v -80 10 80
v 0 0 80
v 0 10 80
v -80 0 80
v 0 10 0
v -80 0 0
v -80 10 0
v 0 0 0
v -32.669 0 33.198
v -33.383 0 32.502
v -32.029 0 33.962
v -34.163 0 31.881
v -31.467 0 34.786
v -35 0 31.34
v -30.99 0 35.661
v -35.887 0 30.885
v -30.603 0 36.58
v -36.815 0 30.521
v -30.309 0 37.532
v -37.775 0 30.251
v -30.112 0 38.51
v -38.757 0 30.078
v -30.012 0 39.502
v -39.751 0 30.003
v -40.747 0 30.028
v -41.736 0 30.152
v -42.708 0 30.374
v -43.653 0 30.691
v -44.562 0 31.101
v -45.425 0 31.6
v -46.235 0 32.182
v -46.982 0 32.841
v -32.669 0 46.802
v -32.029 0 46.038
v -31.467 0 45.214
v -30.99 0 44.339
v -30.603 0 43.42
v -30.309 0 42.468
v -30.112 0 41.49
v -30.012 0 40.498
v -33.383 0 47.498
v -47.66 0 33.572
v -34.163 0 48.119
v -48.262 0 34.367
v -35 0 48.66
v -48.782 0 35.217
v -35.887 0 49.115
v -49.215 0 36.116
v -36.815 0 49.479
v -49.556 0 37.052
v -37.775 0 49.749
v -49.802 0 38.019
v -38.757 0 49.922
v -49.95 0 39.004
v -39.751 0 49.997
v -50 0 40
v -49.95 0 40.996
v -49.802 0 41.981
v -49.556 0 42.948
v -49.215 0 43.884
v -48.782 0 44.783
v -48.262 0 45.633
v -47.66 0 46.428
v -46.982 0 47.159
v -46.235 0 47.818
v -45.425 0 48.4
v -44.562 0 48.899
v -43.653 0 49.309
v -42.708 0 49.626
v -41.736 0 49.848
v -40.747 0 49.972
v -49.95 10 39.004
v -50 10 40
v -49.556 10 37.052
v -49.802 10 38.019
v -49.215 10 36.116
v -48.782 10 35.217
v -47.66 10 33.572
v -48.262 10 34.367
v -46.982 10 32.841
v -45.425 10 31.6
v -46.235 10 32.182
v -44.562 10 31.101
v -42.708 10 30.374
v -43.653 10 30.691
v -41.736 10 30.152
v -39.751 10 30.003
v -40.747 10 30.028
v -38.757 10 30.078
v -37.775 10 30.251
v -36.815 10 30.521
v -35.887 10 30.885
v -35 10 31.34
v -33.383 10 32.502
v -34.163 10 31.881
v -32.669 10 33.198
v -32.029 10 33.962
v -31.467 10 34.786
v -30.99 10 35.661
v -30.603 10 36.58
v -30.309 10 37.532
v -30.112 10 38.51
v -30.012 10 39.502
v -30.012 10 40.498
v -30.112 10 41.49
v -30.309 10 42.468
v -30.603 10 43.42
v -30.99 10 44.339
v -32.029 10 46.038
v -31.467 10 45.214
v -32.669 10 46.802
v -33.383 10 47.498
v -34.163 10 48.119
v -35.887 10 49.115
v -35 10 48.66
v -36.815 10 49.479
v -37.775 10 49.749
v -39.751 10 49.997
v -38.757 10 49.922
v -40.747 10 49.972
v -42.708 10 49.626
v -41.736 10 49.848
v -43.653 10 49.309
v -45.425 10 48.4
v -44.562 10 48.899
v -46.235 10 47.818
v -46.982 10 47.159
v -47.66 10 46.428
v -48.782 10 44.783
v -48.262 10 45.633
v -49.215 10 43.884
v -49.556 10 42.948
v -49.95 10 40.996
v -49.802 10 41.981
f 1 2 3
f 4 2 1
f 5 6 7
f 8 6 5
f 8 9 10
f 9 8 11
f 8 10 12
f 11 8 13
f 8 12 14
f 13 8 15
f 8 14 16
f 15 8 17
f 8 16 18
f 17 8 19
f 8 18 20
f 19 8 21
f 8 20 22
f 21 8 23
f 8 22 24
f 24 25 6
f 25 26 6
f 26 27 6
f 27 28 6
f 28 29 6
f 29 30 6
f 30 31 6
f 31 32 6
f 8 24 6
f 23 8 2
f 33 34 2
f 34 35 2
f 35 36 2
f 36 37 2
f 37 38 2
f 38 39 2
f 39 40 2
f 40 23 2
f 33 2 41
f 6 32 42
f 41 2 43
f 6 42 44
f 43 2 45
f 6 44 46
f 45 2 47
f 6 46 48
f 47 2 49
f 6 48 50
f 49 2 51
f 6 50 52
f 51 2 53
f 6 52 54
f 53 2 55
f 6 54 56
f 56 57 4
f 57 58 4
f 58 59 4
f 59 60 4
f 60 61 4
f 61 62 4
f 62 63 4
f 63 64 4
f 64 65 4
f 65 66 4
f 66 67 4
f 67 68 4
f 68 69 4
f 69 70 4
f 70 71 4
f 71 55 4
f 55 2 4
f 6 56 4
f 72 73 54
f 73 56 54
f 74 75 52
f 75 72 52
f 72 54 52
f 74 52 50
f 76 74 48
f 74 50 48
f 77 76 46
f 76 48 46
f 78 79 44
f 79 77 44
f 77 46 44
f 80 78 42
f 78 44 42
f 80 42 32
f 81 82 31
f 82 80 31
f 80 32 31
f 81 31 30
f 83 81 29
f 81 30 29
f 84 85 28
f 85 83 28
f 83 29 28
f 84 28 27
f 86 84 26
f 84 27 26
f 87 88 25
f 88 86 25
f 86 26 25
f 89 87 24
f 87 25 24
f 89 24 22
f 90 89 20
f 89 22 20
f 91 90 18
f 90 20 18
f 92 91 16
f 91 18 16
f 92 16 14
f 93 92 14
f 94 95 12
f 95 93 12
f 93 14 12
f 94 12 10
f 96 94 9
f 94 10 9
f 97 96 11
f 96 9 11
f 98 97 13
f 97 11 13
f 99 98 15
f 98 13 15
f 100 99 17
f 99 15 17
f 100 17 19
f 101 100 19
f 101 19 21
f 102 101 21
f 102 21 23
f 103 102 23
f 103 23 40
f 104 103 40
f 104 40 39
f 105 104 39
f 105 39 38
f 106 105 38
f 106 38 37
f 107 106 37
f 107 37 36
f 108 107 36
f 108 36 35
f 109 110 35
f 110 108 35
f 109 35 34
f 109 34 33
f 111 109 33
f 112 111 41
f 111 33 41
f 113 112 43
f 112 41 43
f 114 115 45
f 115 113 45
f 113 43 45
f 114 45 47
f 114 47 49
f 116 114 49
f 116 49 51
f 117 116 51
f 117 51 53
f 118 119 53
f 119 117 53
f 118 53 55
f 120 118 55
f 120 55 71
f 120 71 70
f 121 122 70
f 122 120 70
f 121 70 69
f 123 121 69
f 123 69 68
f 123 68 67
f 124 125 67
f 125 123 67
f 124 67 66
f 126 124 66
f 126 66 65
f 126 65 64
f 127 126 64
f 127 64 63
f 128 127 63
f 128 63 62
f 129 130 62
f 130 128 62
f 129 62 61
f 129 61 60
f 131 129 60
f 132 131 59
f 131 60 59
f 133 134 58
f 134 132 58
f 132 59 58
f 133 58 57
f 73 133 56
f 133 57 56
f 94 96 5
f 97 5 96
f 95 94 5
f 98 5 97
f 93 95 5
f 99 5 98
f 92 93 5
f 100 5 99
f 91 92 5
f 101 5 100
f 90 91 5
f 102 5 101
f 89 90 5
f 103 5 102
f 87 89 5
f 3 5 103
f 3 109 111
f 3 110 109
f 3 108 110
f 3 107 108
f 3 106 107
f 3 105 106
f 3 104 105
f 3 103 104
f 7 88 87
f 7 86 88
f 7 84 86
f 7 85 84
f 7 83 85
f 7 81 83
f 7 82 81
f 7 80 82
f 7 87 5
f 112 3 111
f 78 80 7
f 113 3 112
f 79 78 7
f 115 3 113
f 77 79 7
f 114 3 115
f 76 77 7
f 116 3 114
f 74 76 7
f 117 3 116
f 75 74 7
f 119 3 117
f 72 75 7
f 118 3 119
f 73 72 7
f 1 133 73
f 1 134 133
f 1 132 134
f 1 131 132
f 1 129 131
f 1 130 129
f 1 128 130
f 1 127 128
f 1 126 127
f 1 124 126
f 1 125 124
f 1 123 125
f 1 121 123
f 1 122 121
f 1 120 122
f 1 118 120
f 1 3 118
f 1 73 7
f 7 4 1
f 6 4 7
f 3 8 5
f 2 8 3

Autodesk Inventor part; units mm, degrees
ref_plane "YZ Plane" through (0, 0, 0) normal (1, 0, 0) x (0, 1, 0)
ref_plane "XZ Plane" through (0, 0, 0) normal (0, 1, 0) x (-1, 0, 0)
ref_plane "XY Plane" through (0, 0, 0) normal (0, 0, 1) x (1, 0, 0)
sketch "Sketch1" plane through (0, 0, 0) normal (0, 1, 0) x (-1, 0, 0)
  line L0 (0, 0) -> (0, 80)
  line L1 (0, 80) -> (80, 80)
  line L2 (80, 80) -> (80, 0)
  line L3 (80, 0) -> (0, 0)
  circle A0 centre (40, 40) radius 10
  dimension "d0" = 80
extrude "Extrusion1" add sketch "Sketch1" along normal blind 10
properties part number "P1-5"
